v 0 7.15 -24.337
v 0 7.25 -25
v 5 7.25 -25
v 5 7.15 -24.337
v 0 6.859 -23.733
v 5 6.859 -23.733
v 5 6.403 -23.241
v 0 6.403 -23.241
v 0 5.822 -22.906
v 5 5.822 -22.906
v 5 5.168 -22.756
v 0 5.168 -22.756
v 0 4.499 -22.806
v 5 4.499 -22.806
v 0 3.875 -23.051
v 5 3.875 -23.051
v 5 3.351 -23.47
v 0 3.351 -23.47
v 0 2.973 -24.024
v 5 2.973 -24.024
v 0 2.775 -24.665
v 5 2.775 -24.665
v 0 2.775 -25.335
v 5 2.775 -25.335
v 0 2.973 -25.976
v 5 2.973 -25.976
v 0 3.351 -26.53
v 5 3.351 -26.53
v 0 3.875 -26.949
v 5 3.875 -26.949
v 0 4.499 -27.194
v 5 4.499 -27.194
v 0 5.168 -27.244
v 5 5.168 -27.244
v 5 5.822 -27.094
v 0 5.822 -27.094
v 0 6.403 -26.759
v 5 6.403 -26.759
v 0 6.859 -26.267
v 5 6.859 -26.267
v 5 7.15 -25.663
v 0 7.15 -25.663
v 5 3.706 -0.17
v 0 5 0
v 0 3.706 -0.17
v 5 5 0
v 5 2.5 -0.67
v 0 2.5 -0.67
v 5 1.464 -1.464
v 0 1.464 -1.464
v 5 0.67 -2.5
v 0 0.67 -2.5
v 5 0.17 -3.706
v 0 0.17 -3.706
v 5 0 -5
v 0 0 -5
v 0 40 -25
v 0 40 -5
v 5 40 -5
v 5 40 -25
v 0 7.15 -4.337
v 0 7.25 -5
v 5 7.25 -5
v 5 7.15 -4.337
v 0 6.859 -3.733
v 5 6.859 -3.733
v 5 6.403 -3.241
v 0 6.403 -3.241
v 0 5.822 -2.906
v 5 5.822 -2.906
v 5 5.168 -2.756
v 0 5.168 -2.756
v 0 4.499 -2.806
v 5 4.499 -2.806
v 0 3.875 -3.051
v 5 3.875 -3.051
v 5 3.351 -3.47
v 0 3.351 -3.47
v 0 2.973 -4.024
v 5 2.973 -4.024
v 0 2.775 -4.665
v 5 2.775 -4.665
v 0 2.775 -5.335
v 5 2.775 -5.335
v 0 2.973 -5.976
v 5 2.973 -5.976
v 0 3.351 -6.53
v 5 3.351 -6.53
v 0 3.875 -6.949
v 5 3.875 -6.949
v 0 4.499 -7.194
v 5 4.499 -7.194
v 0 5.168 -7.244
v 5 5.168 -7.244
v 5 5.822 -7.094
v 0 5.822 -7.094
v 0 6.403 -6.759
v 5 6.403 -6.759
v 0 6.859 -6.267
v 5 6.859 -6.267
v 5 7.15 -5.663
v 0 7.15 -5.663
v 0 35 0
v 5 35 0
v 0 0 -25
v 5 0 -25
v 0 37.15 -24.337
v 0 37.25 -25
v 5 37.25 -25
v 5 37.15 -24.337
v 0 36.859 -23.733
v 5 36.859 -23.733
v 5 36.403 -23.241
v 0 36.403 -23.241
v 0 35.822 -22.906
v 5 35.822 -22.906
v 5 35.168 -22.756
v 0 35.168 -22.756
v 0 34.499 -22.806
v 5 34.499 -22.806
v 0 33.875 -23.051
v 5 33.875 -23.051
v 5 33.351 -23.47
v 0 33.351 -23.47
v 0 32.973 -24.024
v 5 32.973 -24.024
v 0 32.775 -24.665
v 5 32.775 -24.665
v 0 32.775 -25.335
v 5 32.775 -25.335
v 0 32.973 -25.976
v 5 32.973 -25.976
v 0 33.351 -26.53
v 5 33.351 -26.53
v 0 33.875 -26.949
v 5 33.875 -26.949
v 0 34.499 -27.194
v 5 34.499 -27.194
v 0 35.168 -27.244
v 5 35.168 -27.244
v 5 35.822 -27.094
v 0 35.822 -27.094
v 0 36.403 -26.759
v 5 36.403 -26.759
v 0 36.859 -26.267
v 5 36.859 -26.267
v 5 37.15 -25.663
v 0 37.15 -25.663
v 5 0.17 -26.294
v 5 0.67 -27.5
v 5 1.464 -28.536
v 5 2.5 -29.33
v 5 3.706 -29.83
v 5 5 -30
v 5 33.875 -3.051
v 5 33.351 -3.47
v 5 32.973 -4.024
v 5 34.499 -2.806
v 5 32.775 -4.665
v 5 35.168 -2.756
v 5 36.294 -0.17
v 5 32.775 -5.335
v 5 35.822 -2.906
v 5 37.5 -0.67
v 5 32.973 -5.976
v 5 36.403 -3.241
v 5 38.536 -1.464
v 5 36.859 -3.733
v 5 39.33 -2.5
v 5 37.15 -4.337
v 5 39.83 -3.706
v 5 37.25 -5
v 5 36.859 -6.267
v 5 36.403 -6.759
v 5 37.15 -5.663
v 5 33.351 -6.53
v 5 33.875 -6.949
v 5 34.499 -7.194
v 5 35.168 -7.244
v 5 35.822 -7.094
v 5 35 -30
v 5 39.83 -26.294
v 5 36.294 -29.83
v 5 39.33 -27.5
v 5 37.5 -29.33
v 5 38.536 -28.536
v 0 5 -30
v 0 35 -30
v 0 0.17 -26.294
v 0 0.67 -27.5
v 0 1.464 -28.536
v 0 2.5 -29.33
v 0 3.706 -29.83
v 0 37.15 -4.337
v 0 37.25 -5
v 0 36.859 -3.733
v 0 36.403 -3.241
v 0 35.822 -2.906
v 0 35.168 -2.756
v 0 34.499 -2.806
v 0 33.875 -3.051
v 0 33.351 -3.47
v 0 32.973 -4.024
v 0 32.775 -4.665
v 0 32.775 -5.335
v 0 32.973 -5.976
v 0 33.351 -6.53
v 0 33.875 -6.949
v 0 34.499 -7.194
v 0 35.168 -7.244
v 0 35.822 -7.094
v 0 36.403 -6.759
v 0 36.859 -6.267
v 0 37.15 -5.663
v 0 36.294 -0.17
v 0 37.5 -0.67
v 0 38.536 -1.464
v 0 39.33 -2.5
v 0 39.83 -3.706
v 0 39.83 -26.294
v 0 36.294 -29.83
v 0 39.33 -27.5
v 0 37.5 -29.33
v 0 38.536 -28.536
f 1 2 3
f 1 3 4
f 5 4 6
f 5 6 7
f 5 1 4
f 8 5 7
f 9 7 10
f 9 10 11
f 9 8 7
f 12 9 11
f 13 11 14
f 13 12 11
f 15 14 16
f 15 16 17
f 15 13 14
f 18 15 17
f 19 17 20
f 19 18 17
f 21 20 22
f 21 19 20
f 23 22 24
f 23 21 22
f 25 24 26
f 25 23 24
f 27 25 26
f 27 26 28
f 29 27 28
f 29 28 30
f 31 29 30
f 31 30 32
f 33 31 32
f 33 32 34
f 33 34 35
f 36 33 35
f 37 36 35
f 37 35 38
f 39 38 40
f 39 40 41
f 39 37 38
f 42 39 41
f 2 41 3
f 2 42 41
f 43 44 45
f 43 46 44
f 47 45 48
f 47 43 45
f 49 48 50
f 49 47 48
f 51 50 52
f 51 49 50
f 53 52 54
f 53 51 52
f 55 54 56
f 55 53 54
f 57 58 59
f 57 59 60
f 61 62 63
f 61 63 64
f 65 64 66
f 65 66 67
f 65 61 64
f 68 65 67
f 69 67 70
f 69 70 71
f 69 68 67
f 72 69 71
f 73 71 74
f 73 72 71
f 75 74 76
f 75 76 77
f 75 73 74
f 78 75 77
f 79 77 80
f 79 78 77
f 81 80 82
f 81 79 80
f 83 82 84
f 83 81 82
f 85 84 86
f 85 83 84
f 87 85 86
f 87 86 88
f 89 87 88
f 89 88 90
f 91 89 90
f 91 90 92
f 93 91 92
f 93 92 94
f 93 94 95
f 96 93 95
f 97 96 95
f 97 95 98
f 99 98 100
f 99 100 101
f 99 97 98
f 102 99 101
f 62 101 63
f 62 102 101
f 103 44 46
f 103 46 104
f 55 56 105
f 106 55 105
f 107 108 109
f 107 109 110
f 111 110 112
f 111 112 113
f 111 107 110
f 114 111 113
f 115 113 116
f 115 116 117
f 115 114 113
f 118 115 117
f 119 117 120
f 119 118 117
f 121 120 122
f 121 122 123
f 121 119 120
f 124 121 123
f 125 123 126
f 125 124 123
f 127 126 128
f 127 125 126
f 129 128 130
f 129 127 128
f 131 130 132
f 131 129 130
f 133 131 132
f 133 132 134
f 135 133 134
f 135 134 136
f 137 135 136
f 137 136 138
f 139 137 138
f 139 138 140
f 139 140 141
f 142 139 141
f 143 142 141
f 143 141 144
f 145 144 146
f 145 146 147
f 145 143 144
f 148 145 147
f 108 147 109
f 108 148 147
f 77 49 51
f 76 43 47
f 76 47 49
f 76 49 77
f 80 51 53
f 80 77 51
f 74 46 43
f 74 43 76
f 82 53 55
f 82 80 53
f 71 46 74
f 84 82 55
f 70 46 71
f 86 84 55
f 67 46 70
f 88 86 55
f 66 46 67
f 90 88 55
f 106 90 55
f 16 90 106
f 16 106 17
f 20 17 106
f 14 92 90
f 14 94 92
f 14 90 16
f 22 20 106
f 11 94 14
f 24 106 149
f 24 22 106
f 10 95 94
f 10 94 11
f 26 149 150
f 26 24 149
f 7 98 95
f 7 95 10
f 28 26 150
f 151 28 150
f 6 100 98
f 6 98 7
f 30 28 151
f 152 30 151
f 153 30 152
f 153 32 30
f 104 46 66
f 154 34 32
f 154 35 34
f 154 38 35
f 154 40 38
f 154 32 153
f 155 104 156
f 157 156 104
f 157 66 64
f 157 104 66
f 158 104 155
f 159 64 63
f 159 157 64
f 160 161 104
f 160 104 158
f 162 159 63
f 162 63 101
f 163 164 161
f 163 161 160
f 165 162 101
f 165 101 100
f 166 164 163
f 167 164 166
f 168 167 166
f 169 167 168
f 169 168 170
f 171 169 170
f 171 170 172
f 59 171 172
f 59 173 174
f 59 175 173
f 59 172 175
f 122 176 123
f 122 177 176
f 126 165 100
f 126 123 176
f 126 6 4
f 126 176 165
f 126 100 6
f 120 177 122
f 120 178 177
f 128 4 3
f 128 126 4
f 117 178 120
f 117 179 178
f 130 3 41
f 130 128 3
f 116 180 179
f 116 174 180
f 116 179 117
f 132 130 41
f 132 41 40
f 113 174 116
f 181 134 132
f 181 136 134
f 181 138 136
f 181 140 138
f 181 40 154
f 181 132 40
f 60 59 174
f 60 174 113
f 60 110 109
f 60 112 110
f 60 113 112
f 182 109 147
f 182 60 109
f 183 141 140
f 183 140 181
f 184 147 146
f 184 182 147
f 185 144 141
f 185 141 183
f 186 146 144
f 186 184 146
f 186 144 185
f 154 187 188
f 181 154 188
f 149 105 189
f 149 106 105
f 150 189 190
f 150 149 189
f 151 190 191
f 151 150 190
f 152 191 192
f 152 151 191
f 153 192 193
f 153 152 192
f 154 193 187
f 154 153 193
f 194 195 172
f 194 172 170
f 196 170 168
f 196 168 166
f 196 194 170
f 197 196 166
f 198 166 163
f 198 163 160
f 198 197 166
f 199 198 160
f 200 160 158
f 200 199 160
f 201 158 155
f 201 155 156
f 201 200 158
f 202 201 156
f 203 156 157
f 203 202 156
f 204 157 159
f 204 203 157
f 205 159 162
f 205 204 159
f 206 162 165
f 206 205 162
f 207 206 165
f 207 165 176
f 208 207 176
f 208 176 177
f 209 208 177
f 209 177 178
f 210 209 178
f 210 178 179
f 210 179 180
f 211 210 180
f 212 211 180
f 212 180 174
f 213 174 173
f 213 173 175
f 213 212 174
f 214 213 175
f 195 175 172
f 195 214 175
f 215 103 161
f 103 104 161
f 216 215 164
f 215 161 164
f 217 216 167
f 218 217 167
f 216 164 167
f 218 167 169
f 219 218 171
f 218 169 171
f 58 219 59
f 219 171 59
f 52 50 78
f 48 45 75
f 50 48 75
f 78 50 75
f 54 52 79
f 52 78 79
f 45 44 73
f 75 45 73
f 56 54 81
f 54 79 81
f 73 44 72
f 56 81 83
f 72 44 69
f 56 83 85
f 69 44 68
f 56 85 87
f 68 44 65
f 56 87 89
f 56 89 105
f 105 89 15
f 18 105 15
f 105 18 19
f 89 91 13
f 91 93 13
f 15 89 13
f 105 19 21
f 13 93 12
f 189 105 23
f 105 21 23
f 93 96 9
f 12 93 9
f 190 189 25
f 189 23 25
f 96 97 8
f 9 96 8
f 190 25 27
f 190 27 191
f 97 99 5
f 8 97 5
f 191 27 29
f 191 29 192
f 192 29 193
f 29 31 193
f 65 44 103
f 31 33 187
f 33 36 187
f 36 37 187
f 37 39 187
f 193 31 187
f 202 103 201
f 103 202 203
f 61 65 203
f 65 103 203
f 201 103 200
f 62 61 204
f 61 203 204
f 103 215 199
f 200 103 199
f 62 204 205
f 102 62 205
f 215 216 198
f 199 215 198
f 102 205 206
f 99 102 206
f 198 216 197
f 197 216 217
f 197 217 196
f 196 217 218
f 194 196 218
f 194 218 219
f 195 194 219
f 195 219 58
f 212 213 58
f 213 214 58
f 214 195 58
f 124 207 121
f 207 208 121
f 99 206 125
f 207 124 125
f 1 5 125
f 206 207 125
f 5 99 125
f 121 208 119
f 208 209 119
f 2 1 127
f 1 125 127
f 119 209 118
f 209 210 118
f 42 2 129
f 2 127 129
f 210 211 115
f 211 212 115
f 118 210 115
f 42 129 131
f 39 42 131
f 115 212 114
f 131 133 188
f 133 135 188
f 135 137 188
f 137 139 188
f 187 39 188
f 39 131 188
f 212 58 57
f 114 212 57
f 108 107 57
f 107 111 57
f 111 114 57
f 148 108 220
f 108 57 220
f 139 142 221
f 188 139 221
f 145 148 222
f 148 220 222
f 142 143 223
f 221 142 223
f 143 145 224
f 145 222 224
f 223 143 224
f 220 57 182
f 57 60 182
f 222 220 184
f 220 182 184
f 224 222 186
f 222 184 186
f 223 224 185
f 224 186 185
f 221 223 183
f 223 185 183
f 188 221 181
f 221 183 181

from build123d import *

# Parameters (mm, degrees)
SKETCH_1_W                 = 30
SKETCH_1_H                 = 40
EXTRUDE_1_DEPTH            = 5
HOLE_WIZARD_M4_1_OUTLINE_R = 2.25
HOLE_WIZARD_M4_1_DEPTH     = 5
FILLET_1_R                 = 5


# Read off the part's stored shape, not the designer's step: M4 间隙孔1
with BuildPart() as part:
    # 草图1 → 凸台-拉伸1 (new body)
    with BuildSketch(Plane(origin=(0, 0, 0), x_dir=(0, 0, -1), z_dir=(1, 0, 0))):
        with Locations((15, 20)):
            Rectangle(SKETCH_1_W, SKETCH_1_H)
    extrude(amount=EXTRUDE_1_DEPTH)

    # M4 间隙孔1 outline → M4 间隙孔1 (cut)
    with BuildSketch(Plane.YZ):
        with Locations((35, -5)):
            Circle(HOLE_WIZARD_M4_1_OUTLINE_R)
        with Locations((5, -25)):
            Circle(HOLE_WIZARD_M4_1_OUTLINE_R)
        with Locations((5, -5)):
            Circle(HOLE_WIZARD_M4_1_OUTLINE_R)
        with Locations((35, -25)):
            Circle(HOLE_WIZARD_M4_1_OUTLINE_R)
    extrude(amount=HOLE_WIZARD_M4_1_DEPTH, mode=Mode.SUBTRACT)

    # 圆角1
    fillet_1_edges = [part.edges().sort_by_distance(p)[0] for p in [
        (2.5, 40, 0),
        (2.5, 40, -30),
        (2.5, 0, -30),
        (2.5, 0, 0),
    ]]
    fillet(fillet_1_edges, radius=FILLET_1_R)


solid = part.part
